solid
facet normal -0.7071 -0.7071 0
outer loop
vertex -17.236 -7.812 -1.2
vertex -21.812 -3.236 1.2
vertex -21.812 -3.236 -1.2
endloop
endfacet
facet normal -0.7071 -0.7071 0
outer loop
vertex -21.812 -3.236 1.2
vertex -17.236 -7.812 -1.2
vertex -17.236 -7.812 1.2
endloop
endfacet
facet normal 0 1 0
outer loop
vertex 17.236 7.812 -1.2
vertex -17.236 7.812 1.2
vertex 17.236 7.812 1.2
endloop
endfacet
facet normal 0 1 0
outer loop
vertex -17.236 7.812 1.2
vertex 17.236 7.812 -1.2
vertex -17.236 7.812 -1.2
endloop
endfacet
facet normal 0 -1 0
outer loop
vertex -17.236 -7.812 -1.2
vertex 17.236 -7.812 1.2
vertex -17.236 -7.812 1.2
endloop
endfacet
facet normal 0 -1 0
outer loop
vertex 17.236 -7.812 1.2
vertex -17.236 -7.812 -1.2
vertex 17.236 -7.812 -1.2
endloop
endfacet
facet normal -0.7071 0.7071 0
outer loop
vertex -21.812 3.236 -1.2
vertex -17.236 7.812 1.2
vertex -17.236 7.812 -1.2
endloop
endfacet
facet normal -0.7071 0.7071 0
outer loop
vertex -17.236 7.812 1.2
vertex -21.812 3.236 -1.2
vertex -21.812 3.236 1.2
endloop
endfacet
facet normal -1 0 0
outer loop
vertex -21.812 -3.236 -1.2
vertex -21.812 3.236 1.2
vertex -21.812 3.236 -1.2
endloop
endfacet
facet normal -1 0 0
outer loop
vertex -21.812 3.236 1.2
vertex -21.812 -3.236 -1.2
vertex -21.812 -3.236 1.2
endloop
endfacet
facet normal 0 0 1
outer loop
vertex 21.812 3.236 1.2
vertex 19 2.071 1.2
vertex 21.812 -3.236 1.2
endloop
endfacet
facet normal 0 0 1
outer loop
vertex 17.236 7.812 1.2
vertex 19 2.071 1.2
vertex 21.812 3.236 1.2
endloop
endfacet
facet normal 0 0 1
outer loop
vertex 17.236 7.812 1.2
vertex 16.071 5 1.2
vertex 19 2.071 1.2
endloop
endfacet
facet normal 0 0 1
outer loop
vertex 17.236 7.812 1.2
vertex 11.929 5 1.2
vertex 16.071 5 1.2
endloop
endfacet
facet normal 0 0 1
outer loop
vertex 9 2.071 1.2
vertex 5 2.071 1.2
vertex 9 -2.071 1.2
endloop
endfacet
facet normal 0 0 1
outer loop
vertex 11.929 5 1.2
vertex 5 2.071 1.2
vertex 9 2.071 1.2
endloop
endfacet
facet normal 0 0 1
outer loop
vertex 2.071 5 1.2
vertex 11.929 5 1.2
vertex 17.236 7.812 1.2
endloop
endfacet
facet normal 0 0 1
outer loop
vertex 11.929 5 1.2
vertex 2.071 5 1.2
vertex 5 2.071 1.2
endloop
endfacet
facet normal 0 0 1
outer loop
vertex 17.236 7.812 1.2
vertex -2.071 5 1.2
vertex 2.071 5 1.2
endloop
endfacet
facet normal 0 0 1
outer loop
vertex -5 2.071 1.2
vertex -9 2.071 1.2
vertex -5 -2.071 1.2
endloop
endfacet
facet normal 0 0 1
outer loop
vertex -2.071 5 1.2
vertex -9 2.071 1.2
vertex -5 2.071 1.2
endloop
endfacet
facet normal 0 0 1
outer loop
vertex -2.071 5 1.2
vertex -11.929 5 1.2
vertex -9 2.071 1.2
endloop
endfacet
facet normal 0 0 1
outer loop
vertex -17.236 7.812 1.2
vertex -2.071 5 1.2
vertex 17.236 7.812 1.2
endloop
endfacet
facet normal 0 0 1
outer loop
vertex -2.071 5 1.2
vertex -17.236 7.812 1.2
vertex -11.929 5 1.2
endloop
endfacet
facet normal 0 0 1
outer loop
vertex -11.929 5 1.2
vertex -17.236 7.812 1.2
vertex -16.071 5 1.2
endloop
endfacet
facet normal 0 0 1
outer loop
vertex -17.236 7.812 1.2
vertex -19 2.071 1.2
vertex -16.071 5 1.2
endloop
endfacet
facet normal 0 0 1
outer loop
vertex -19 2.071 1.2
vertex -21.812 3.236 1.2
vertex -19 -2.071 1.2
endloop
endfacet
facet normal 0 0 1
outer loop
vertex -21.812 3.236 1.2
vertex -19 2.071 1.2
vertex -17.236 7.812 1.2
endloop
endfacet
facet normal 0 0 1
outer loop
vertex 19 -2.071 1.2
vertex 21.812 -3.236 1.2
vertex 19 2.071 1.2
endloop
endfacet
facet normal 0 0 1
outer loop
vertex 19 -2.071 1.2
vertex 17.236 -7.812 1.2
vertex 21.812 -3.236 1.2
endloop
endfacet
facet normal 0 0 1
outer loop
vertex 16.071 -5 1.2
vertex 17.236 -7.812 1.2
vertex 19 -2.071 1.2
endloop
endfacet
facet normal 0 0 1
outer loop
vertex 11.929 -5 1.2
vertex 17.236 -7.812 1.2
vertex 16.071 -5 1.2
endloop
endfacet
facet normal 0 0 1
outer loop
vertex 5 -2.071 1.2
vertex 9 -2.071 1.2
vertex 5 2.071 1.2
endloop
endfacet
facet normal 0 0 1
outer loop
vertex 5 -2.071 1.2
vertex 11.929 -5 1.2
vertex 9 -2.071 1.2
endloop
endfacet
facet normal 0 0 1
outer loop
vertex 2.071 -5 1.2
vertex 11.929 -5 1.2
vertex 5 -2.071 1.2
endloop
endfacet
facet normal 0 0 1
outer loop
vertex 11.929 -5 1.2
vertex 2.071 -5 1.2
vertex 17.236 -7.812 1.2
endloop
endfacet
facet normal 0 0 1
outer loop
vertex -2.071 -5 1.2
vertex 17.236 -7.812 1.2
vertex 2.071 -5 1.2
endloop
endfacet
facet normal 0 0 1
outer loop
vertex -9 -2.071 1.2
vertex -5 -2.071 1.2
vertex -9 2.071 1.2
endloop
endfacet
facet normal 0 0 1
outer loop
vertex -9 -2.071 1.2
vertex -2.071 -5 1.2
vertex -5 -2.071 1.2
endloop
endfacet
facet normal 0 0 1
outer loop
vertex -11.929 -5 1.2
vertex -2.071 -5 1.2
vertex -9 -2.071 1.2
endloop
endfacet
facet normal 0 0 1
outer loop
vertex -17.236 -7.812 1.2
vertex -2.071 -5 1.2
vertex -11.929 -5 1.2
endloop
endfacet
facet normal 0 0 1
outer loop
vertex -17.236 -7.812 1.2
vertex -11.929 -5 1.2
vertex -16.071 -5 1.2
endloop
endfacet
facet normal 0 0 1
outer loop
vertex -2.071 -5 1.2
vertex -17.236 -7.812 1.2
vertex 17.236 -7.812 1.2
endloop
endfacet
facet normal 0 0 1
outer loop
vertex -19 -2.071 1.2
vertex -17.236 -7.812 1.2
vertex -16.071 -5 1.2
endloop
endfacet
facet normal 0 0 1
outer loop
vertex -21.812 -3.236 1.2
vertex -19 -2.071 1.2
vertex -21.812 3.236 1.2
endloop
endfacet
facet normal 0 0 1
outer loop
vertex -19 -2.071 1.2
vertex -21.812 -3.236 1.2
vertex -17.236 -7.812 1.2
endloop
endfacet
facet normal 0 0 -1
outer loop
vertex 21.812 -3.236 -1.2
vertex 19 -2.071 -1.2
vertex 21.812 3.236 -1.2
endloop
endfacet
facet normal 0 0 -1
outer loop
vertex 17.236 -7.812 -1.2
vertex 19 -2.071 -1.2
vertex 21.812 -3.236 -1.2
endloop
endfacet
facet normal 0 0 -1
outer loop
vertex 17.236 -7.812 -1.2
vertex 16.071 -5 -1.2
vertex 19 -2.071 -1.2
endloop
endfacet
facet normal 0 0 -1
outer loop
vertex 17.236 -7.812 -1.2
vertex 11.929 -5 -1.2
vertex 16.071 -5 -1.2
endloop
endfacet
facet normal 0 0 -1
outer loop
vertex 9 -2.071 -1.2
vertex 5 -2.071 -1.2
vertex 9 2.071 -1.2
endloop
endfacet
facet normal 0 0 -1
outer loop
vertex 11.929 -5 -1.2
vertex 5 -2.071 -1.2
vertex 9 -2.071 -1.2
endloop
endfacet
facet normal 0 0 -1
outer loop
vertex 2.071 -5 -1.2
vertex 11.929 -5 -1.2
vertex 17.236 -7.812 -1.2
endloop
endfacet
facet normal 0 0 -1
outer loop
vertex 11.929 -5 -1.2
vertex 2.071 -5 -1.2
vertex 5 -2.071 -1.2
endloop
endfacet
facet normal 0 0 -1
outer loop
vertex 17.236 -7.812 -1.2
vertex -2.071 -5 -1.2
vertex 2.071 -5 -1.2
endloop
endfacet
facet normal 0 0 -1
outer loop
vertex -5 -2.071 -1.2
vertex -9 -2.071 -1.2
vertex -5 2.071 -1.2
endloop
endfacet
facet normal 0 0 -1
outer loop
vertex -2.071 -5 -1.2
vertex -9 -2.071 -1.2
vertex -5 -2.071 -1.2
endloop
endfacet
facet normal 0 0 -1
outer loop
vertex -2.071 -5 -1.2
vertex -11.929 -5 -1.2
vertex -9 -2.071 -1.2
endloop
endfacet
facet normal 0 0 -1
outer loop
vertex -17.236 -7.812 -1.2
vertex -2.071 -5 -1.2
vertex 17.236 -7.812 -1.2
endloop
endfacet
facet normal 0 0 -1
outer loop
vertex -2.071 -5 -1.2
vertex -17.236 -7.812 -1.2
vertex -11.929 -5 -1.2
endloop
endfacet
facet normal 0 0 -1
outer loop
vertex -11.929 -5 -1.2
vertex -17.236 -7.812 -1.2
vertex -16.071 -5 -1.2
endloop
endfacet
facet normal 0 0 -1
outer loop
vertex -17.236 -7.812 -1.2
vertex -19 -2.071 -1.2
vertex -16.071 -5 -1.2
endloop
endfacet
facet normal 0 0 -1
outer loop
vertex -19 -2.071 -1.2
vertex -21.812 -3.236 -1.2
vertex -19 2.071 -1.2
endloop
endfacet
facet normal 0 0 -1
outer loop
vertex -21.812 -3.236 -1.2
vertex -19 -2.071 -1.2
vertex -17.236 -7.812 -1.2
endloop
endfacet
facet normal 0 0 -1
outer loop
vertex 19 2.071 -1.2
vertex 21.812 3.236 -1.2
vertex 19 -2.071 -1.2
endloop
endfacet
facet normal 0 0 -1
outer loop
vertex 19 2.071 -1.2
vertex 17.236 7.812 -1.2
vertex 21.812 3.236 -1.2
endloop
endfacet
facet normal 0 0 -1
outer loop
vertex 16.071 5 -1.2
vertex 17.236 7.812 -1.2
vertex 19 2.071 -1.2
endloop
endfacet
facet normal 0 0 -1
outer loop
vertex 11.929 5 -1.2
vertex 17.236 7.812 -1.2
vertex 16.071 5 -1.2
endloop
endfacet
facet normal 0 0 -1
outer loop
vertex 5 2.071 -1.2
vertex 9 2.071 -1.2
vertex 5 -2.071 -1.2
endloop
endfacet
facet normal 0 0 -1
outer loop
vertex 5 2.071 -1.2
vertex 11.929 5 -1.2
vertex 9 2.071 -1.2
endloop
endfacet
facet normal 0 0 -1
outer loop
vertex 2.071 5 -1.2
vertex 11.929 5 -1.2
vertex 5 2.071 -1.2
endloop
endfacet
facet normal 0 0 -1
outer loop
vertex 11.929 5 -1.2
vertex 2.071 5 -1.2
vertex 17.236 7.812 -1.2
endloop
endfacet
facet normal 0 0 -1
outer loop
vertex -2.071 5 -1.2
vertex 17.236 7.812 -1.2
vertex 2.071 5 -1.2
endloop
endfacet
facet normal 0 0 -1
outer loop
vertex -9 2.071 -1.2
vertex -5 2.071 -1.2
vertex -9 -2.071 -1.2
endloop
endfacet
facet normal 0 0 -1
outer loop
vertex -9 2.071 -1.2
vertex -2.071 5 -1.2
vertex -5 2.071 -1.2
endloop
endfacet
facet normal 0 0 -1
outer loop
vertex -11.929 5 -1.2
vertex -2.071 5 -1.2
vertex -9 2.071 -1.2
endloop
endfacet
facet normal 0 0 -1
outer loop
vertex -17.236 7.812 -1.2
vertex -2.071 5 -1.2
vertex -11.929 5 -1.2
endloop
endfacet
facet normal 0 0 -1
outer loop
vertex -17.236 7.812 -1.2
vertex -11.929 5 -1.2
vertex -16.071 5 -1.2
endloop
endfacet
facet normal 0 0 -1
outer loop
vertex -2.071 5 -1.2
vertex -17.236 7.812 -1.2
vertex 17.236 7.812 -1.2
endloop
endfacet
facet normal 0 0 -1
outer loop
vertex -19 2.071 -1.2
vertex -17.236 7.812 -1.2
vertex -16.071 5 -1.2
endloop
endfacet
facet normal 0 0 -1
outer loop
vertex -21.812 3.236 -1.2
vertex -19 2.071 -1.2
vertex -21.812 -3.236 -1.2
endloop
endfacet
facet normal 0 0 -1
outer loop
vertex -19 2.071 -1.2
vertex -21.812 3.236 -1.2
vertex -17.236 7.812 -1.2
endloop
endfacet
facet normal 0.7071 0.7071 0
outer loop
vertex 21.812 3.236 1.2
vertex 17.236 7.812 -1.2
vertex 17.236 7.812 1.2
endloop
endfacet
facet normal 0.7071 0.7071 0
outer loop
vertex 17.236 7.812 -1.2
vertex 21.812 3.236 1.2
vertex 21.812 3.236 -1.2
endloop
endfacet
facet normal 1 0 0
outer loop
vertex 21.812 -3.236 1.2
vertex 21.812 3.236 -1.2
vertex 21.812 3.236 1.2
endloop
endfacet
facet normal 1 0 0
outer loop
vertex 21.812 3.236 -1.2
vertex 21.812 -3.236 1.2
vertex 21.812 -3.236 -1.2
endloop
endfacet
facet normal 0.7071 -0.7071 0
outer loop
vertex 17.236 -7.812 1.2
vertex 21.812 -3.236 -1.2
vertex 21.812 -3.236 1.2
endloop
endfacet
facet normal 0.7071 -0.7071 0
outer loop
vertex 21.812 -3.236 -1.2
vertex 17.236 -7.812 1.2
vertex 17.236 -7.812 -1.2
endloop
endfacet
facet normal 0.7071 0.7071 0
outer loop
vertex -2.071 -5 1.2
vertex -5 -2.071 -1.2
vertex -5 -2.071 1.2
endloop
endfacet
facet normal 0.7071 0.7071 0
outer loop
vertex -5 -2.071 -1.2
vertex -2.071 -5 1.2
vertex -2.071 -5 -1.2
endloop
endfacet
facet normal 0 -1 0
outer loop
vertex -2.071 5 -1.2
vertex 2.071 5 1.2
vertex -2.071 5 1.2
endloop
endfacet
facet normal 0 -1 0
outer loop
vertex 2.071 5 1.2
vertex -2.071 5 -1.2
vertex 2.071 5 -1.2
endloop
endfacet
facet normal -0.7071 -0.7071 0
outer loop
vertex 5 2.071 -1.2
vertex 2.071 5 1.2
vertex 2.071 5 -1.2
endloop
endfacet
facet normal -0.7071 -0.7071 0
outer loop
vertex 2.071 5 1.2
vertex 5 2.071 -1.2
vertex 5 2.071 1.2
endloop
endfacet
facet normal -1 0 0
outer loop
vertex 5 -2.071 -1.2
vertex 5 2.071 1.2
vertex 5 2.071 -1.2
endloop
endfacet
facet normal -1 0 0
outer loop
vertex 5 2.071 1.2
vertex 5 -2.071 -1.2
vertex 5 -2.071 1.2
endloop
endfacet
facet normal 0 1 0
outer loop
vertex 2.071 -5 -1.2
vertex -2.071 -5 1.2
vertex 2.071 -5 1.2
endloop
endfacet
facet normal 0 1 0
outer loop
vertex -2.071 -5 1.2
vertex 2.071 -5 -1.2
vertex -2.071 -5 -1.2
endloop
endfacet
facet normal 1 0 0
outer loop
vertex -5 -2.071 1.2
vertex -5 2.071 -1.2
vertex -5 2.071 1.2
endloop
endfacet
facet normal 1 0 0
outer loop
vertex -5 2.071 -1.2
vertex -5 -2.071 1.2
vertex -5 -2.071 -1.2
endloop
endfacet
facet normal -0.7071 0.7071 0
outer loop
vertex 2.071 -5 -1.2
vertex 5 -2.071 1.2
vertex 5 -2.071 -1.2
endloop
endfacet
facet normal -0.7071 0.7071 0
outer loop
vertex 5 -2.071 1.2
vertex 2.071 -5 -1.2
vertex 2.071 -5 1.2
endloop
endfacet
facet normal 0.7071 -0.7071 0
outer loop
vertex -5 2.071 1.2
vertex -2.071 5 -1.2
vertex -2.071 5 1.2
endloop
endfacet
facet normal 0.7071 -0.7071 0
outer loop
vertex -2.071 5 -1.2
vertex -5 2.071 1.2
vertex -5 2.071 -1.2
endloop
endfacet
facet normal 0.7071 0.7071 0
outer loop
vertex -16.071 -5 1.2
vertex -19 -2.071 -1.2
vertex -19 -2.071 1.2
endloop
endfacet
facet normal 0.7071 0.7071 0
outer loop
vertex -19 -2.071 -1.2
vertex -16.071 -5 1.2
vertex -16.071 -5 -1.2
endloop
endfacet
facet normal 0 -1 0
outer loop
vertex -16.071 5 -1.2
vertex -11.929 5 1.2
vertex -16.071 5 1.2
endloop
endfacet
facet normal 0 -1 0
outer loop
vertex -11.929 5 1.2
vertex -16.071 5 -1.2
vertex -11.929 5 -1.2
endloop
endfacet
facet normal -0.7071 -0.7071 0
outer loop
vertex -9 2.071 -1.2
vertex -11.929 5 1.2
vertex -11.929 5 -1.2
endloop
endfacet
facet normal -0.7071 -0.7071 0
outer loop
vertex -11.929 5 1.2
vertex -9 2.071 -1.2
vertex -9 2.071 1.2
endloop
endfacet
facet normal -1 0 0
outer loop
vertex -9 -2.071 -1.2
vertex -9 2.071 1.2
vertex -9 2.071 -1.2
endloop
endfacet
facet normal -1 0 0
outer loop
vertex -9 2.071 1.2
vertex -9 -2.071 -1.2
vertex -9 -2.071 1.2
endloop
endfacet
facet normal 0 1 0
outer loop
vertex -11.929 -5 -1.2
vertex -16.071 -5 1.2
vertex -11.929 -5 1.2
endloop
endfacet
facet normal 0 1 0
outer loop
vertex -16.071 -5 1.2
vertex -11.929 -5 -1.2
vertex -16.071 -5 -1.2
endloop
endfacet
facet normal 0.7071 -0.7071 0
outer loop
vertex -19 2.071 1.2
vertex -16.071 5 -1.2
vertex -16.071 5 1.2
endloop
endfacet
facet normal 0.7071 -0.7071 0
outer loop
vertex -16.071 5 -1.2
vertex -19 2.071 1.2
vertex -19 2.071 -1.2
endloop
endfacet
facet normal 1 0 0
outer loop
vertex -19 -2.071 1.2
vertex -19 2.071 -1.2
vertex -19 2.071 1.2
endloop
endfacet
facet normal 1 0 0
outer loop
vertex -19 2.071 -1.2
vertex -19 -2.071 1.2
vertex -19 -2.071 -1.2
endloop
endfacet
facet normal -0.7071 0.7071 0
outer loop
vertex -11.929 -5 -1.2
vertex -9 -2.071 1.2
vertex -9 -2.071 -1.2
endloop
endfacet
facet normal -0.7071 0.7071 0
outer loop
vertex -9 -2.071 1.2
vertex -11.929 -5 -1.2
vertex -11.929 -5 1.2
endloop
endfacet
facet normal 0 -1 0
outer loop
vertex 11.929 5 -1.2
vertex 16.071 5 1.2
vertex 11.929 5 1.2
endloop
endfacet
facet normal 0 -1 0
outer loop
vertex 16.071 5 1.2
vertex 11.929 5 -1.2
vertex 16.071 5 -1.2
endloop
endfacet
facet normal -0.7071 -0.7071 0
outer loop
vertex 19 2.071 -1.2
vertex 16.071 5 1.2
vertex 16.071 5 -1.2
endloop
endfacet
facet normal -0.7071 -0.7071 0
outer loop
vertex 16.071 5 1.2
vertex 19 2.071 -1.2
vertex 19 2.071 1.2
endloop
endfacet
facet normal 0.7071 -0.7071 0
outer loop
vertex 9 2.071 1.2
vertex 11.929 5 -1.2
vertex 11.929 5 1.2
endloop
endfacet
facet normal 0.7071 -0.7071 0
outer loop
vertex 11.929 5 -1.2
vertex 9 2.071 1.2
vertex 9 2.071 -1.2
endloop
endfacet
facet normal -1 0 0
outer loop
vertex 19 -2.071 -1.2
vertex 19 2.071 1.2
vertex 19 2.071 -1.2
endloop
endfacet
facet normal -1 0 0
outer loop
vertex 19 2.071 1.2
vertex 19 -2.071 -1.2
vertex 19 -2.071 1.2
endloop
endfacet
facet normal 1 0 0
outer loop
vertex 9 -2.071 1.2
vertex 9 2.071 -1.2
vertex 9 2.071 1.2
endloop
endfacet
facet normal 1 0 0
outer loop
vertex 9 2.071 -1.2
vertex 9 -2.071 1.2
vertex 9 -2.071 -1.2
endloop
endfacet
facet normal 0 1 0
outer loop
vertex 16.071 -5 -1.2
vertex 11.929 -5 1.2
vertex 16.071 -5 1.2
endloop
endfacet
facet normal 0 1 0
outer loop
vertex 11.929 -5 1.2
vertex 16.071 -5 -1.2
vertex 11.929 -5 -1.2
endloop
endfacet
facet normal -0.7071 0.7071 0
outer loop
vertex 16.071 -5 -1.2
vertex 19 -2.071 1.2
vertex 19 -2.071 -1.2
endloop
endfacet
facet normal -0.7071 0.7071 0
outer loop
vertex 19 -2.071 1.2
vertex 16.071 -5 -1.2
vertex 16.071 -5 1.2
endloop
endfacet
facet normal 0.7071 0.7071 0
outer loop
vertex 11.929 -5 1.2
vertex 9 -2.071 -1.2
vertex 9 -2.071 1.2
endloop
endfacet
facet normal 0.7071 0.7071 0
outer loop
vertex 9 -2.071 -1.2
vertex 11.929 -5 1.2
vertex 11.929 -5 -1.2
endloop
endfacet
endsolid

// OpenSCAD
ohole = 10;
hole = ohole / cos(180/8);
thick = 2.4;
owid = hole + thick*2;
wid = owid / cos(180/8);
offs = 14;

difference() {
    union() {
        translate([-offs,0,0]) rotate([0,0,180/8]) cylinder(thick, wid/2, wid/2, true, $fn=8);
        translate([ offs,0,0]) rotate([0,0,180/8]) cylinder(thick, wid/2, wid/2, true, $fn=8);
        cube([offs*2, owid, thick], true);
    }
    translate([    0,0,0]) rotate([0,0,180/8]) cylinder(thick+0.1, hole/2, hole/2, true, $fn=8);
    translate([-offs,0,0]) rotate([0,0,180/8]) cylinder(thick+0.1, hole/2, hole/2, true, $fn=8);
    translate([ offs,0,0]) rotate([0,0,180/8]) cylinder(thick+0.1, hole/2, hole/2, true, $fn=8);
}
